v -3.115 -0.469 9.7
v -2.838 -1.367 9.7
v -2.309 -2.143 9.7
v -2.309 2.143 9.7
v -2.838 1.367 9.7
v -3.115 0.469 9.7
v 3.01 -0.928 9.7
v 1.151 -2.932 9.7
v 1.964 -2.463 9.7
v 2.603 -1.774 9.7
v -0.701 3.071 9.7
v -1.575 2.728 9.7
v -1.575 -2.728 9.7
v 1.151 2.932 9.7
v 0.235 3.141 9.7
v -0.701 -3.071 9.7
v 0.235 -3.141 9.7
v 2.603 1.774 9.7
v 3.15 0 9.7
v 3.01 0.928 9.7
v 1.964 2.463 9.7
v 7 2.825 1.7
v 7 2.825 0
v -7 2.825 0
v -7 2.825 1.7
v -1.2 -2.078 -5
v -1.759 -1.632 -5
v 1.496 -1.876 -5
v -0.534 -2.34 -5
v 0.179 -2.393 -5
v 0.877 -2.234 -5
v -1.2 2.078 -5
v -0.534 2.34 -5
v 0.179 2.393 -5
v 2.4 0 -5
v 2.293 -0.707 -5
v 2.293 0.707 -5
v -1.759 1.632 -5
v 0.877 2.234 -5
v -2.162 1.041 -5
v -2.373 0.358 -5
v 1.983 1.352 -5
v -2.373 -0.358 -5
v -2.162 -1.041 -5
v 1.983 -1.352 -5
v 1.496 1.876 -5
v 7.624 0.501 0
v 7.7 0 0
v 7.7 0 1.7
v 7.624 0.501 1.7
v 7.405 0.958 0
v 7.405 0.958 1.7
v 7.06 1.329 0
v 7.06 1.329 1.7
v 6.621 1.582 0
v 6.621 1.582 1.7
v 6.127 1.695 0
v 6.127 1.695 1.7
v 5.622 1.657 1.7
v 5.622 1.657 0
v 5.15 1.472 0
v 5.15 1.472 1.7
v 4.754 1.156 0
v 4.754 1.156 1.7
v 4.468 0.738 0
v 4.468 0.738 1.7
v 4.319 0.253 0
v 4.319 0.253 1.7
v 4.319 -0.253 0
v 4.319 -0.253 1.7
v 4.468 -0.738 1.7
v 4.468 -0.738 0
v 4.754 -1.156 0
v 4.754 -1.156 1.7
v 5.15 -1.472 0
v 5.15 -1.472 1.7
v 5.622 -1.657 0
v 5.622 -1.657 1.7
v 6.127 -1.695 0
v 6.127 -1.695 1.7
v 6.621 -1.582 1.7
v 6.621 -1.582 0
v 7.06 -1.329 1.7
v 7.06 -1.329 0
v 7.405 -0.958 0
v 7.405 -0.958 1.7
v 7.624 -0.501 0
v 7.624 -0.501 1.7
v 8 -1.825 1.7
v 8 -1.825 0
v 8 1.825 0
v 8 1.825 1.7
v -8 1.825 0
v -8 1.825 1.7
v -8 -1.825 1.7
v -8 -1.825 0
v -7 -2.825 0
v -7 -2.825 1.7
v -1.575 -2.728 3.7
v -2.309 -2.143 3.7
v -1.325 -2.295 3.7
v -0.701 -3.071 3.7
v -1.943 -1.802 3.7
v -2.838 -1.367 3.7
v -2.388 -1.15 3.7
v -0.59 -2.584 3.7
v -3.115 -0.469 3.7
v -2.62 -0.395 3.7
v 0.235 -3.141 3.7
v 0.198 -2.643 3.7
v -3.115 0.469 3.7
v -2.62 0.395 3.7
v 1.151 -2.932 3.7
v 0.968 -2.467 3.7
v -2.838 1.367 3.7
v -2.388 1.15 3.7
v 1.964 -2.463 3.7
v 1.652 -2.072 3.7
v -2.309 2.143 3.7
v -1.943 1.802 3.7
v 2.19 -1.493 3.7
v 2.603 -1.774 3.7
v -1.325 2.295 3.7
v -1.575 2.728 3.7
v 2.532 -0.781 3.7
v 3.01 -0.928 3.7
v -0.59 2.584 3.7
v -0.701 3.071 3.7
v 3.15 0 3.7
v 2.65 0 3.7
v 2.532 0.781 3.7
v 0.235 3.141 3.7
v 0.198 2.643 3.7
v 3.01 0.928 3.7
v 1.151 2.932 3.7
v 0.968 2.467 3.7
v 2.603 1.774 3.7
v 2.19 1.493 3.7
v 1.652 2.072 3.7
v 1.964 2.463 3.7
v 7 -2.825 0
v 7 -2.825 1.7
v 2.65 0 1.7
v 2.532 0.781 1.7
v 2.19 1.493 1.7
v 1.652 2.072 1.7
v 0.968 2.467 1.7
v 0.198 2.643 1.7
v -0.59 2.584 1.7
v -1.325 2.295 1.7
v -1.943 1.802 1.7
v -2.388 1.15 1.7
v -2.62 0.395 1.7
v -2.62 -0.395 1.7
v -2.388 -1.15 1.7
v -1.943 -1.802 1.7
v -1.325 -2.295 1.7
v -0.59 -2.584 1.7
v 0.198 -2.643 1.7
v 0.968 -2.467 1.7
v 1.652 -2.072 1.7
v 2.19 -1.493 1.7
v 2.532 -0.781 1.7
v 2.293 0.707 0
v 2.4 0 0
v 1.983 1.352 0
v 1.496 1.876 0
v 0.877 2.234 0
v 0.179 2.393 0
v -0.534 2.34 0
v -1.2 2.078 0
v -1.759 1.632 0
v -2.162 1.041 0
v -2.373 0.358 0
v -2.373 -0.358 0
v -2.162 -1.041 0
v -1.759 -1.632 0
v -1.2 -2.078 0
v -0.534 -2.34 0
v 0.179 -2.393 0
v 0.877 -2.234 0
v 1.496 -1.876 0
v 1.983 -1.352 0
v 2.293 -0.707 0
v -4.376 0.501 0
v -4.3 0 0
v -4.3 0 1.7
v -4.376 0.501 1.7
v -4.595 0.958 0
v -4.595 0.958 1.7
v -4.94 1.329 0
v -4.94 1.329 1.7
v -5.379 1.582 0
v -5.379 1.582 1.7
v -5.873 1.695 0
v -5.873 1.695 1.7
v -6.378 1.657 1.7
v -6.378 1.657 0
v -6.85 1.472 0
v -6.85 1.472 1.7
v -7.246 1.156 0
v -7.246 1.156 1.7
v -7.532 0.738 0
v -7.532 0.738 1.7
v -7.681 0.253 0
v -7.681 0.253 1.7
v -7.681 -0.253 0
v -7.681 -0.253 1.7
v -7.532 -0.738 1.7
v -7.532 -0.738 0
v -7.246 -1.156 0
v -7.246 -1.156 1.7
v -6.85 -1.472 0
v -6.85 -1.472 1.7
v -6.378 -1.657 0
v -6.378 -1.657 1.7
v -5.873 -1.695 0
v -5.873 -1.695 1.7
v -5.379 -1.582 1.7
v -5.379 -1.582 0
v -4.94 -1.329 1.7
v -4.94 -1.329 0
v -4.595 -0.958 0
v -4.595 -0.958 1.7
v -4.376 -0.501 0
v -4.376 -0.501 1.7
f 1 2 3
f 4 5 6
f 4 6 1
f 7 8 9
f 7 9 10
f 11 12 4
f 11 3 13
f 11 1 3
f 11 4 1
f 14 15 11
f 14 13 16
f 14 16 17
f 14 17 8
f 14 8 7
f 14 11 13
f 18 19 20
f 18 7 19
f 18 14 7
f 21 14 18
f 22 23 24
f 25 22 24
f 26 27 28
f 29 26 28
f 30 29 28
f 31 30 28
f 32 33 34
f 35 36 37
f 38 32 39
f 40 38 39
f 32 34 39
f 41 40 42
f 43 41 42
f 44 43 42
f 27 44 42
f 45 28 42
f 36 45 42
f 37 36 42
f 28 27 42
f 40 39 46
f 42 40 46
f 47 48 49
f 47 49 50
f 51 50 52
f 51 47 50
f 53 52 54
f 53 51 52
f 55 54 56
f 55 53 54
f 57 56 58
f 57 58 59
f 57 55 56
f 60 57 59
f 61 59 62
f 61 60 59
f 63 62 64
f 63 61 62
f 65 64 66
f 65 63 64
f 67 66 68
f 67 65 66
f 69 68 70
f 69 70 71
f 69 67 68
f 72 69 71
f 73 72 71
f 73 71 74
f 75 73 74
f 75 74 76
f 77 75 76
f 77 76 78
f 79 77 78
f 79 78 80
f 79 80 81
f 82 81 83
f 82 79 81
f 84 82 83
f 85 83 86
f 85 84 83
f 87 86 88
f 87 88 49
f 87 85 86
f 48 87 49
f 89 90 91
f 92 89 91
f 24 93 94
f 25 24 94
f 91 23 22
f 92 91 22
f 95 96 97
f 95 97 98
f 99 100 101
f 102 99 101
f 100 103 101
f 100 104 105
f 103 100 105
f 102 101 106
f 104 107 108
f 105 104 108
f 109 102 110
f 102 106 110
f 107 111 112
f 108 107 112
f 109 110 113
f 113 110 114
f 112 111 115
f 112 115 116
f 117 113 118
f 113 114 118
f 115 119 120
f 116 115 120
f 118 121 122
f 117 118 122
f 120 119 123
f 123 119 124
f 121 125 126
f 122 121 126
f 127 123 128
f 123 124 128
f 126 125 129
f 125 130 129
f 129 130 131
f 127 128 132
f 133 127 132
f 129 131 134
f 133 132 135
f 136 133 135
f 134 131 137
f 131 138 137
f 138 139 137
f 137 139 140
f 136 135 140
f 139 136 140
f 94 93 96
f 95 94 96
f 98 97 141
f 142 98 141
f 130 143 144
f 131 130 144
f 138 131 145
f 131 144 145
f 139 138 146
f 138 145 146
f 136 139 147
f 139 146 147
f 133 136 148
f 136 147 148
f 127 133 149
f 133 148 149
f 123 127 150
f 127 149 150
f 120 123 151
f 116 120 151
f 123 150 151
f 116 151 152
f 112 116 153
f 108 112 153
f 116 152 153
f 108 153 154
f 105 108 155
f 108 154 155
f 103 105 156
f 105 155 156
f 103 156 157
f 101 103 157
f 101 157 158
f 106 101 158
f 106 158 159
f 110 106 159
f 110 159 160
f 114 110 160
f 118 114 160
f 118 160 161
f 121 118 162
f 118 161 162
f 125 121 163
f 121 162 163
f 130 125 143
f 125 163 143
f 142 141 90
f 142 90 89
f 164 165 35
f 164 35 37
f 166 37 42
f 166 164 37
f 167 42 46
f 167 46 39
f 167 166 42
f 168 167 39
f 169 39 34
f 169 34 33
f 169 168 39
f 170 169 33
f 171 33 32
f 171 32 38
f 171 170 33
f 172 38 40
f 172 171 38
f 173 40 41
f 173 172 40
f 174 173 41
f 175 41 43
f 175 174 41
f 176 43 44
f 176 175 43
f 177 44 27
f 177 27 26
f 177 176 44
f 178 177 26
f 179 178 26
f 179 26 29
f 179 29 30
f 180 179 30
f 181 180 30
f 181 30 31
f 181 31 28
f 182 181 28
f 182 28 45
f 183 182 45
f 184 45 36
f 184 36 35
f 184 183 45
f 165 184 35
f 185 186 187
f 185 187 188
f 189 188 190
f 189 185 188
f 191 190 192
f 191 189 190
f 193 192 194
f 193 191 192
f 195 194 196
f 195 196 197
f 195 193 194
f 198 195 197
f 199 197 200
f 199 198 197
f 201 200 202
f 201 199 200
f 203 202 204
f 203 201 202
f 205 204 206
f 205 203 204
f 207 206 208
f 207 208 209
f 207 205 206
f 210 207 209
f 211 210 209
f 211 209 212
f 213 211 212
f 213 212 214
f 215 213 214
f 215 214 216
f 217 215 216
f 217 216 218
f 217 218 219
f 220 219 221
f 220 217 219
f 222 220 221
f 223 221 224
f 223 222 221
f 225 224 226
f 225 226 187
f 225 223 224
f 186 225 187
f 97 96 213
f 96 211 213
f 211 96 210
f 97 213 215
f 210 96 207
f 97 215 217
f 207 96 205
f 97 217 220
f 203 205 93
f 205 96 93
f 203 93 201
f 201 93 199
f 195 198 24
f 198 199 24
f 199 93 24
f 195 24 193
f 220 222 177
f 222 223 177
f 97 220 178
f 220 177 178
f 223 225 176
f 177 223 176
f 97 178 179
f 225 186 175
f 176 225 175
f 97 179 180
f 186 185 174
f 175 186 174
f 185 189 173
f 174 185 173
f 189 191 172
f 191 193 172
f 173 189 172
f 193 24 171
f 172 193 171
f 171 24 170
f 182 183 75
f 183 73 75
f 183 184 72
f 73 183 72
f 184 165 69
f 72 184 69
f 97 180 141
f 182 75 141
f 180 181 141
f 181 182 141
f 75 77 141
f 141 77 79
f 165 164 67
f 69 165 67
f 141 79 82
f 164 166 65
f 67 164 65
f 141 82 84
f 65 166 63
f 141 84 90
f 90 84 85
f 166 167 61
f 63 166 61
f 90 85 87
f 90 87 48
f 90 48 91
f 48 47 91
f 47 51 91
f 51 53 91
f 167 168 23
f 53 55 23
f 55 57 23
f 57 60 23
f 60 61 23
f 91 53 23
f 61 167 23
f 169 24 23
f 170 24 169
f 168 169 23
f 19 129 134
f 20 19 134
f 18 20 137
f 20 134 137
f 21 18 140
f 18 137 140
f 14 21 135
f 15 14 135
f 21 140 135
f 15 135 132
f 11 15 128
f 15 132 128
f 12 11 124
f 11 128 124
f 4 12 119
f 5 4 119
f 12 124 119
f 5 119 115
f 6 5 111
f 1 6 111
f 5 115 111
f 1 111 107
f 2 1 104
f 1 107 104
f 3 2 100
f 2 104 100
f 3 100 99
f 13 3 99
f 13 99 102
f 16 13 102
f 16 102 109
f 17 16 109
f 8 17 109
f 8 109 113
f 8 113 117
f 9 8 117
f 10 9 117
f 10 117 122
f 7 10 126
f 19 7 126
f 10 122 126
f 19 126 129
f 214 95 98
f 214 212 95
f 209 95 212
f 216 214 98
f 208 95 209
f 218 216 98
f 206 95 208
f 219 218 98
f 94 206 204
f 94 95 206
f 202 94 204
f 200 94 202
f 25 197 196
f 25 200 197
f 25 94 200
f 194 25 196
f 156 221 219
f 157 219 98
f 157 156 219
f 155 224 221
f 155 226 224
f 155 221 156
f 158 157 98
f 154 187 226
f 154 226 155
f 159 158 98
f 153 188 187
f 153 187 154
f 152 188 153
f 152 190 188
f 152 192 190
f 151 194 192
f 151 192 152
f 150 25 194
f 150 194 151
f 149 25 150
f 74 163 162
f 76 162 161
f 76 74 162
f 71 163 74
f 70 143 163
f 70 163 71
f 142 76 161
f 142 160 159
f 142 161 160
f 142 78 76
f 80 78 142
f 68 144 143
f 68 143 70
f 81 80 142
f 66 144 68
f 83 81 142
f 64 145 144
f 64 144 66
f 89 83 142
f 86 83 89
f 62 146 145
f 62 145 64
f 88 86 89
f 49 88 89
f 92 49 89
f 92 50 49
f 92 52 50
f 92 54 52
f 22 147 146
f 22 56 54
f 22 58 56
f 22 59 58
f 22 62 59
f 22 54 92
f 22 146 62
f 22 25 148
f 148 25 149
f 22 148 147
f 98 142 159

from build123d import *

# Parameters (mm, degrees)
F0_R     = 1.7
F0_R_2   = 2.65
F1_DEPTH = 1.7
F2_R     = 2.65
F3_DEPTH = 2
F4_R     = 3.15
F5_DEPTH = 6
F6_SIZE  = 1
F7_R     = 2.4
F8_DEPTH = 5


with BuildPart() as f1:
    # F0 (on Top) → F1 (new body)
    with BuildSketch(Plane.XY):
        with BuildLine():
            Line((1.393512, -2.825), (8, -2.825))
            Line((8, -2.825), (8, 2.825))
            Line((8, 2.825), (1.393512, 2.825))
            ThreePointArc((1.393512, 2.825), (2.675076, 1.663271), (3.15, 0))
            ThreePointArc((3.15, 0), (2.675076, -1.663271), (1.393512, -2.825))
        make_face()
        with Locations((6, 0)):
            Circle(F0_R, mode=Mode.SUBTRACT)
        with BuildLine():
            Line((-8, -2.825), (-1.393512, -2.825))
            ThreePointArc((-1.393512, -2.825), (-3.15, 0), (-1.393512, 2.825))
            Line((-1.393512, 2.825), (-8, 2.825))
            Line((-8, 2.825), (-8, -2.825))
        make_face()
        with Locations((-6, 0)):
            Circle(F0_R, mode=Mode.SUBTRACT)
        with BuildLine():
            Line((-1.393512, -2.825), (1.393512, -2.825))
            ThreePointArc((1.393512, -2.825), (2.675076, -1.663271), (3.15, 0))
            ThreePointArc((3.15, 0), (2.675076, 1.663271), (1.393512, 2.825))
            Line((1.393512, 2.825), (-1.393512, 2.825))
            ThreePointArc((-1.393512, 2.825), (-3.15, 0), (-1.393512, -2.825))
        make_face()
        Circle(F0_R_2, mode=Mode.SUBTRACT)
        Circle(F0_R_2)
    extrude(amount=F1_DEPTH)

    # F2 (on face) → F3 (join)
    with BuildSketch(Plane.XY.offset(1.7)):
        Circle(F2_R)
    extrude(amount=F3_DEPTH)

    # F4 (on face) → F5 (join)
    with BuildSketch(Plane.XY.offset(3.7)):
        Circle(F4_R)
    extrude(amount=F5_DEPTH)

    # F6
    f6_edges = [f1.edges().sort_by_distance(p)[0] for p in [
        (-8, -2.825, 0.85),
        (-8, 2.825, 0.85),
        (8, -2.825, 0.85),
        (8, 2.825, 0.85),
    ]]
    chamfer(f6_edges, length=F6_SIZE)

    # F7 (on face) → F8 (join)
    with BuildSketch(Plane.XY):
        Circle(F7_R)
    extrude(amount=-F8_DEPTH)


solid = f1.part
